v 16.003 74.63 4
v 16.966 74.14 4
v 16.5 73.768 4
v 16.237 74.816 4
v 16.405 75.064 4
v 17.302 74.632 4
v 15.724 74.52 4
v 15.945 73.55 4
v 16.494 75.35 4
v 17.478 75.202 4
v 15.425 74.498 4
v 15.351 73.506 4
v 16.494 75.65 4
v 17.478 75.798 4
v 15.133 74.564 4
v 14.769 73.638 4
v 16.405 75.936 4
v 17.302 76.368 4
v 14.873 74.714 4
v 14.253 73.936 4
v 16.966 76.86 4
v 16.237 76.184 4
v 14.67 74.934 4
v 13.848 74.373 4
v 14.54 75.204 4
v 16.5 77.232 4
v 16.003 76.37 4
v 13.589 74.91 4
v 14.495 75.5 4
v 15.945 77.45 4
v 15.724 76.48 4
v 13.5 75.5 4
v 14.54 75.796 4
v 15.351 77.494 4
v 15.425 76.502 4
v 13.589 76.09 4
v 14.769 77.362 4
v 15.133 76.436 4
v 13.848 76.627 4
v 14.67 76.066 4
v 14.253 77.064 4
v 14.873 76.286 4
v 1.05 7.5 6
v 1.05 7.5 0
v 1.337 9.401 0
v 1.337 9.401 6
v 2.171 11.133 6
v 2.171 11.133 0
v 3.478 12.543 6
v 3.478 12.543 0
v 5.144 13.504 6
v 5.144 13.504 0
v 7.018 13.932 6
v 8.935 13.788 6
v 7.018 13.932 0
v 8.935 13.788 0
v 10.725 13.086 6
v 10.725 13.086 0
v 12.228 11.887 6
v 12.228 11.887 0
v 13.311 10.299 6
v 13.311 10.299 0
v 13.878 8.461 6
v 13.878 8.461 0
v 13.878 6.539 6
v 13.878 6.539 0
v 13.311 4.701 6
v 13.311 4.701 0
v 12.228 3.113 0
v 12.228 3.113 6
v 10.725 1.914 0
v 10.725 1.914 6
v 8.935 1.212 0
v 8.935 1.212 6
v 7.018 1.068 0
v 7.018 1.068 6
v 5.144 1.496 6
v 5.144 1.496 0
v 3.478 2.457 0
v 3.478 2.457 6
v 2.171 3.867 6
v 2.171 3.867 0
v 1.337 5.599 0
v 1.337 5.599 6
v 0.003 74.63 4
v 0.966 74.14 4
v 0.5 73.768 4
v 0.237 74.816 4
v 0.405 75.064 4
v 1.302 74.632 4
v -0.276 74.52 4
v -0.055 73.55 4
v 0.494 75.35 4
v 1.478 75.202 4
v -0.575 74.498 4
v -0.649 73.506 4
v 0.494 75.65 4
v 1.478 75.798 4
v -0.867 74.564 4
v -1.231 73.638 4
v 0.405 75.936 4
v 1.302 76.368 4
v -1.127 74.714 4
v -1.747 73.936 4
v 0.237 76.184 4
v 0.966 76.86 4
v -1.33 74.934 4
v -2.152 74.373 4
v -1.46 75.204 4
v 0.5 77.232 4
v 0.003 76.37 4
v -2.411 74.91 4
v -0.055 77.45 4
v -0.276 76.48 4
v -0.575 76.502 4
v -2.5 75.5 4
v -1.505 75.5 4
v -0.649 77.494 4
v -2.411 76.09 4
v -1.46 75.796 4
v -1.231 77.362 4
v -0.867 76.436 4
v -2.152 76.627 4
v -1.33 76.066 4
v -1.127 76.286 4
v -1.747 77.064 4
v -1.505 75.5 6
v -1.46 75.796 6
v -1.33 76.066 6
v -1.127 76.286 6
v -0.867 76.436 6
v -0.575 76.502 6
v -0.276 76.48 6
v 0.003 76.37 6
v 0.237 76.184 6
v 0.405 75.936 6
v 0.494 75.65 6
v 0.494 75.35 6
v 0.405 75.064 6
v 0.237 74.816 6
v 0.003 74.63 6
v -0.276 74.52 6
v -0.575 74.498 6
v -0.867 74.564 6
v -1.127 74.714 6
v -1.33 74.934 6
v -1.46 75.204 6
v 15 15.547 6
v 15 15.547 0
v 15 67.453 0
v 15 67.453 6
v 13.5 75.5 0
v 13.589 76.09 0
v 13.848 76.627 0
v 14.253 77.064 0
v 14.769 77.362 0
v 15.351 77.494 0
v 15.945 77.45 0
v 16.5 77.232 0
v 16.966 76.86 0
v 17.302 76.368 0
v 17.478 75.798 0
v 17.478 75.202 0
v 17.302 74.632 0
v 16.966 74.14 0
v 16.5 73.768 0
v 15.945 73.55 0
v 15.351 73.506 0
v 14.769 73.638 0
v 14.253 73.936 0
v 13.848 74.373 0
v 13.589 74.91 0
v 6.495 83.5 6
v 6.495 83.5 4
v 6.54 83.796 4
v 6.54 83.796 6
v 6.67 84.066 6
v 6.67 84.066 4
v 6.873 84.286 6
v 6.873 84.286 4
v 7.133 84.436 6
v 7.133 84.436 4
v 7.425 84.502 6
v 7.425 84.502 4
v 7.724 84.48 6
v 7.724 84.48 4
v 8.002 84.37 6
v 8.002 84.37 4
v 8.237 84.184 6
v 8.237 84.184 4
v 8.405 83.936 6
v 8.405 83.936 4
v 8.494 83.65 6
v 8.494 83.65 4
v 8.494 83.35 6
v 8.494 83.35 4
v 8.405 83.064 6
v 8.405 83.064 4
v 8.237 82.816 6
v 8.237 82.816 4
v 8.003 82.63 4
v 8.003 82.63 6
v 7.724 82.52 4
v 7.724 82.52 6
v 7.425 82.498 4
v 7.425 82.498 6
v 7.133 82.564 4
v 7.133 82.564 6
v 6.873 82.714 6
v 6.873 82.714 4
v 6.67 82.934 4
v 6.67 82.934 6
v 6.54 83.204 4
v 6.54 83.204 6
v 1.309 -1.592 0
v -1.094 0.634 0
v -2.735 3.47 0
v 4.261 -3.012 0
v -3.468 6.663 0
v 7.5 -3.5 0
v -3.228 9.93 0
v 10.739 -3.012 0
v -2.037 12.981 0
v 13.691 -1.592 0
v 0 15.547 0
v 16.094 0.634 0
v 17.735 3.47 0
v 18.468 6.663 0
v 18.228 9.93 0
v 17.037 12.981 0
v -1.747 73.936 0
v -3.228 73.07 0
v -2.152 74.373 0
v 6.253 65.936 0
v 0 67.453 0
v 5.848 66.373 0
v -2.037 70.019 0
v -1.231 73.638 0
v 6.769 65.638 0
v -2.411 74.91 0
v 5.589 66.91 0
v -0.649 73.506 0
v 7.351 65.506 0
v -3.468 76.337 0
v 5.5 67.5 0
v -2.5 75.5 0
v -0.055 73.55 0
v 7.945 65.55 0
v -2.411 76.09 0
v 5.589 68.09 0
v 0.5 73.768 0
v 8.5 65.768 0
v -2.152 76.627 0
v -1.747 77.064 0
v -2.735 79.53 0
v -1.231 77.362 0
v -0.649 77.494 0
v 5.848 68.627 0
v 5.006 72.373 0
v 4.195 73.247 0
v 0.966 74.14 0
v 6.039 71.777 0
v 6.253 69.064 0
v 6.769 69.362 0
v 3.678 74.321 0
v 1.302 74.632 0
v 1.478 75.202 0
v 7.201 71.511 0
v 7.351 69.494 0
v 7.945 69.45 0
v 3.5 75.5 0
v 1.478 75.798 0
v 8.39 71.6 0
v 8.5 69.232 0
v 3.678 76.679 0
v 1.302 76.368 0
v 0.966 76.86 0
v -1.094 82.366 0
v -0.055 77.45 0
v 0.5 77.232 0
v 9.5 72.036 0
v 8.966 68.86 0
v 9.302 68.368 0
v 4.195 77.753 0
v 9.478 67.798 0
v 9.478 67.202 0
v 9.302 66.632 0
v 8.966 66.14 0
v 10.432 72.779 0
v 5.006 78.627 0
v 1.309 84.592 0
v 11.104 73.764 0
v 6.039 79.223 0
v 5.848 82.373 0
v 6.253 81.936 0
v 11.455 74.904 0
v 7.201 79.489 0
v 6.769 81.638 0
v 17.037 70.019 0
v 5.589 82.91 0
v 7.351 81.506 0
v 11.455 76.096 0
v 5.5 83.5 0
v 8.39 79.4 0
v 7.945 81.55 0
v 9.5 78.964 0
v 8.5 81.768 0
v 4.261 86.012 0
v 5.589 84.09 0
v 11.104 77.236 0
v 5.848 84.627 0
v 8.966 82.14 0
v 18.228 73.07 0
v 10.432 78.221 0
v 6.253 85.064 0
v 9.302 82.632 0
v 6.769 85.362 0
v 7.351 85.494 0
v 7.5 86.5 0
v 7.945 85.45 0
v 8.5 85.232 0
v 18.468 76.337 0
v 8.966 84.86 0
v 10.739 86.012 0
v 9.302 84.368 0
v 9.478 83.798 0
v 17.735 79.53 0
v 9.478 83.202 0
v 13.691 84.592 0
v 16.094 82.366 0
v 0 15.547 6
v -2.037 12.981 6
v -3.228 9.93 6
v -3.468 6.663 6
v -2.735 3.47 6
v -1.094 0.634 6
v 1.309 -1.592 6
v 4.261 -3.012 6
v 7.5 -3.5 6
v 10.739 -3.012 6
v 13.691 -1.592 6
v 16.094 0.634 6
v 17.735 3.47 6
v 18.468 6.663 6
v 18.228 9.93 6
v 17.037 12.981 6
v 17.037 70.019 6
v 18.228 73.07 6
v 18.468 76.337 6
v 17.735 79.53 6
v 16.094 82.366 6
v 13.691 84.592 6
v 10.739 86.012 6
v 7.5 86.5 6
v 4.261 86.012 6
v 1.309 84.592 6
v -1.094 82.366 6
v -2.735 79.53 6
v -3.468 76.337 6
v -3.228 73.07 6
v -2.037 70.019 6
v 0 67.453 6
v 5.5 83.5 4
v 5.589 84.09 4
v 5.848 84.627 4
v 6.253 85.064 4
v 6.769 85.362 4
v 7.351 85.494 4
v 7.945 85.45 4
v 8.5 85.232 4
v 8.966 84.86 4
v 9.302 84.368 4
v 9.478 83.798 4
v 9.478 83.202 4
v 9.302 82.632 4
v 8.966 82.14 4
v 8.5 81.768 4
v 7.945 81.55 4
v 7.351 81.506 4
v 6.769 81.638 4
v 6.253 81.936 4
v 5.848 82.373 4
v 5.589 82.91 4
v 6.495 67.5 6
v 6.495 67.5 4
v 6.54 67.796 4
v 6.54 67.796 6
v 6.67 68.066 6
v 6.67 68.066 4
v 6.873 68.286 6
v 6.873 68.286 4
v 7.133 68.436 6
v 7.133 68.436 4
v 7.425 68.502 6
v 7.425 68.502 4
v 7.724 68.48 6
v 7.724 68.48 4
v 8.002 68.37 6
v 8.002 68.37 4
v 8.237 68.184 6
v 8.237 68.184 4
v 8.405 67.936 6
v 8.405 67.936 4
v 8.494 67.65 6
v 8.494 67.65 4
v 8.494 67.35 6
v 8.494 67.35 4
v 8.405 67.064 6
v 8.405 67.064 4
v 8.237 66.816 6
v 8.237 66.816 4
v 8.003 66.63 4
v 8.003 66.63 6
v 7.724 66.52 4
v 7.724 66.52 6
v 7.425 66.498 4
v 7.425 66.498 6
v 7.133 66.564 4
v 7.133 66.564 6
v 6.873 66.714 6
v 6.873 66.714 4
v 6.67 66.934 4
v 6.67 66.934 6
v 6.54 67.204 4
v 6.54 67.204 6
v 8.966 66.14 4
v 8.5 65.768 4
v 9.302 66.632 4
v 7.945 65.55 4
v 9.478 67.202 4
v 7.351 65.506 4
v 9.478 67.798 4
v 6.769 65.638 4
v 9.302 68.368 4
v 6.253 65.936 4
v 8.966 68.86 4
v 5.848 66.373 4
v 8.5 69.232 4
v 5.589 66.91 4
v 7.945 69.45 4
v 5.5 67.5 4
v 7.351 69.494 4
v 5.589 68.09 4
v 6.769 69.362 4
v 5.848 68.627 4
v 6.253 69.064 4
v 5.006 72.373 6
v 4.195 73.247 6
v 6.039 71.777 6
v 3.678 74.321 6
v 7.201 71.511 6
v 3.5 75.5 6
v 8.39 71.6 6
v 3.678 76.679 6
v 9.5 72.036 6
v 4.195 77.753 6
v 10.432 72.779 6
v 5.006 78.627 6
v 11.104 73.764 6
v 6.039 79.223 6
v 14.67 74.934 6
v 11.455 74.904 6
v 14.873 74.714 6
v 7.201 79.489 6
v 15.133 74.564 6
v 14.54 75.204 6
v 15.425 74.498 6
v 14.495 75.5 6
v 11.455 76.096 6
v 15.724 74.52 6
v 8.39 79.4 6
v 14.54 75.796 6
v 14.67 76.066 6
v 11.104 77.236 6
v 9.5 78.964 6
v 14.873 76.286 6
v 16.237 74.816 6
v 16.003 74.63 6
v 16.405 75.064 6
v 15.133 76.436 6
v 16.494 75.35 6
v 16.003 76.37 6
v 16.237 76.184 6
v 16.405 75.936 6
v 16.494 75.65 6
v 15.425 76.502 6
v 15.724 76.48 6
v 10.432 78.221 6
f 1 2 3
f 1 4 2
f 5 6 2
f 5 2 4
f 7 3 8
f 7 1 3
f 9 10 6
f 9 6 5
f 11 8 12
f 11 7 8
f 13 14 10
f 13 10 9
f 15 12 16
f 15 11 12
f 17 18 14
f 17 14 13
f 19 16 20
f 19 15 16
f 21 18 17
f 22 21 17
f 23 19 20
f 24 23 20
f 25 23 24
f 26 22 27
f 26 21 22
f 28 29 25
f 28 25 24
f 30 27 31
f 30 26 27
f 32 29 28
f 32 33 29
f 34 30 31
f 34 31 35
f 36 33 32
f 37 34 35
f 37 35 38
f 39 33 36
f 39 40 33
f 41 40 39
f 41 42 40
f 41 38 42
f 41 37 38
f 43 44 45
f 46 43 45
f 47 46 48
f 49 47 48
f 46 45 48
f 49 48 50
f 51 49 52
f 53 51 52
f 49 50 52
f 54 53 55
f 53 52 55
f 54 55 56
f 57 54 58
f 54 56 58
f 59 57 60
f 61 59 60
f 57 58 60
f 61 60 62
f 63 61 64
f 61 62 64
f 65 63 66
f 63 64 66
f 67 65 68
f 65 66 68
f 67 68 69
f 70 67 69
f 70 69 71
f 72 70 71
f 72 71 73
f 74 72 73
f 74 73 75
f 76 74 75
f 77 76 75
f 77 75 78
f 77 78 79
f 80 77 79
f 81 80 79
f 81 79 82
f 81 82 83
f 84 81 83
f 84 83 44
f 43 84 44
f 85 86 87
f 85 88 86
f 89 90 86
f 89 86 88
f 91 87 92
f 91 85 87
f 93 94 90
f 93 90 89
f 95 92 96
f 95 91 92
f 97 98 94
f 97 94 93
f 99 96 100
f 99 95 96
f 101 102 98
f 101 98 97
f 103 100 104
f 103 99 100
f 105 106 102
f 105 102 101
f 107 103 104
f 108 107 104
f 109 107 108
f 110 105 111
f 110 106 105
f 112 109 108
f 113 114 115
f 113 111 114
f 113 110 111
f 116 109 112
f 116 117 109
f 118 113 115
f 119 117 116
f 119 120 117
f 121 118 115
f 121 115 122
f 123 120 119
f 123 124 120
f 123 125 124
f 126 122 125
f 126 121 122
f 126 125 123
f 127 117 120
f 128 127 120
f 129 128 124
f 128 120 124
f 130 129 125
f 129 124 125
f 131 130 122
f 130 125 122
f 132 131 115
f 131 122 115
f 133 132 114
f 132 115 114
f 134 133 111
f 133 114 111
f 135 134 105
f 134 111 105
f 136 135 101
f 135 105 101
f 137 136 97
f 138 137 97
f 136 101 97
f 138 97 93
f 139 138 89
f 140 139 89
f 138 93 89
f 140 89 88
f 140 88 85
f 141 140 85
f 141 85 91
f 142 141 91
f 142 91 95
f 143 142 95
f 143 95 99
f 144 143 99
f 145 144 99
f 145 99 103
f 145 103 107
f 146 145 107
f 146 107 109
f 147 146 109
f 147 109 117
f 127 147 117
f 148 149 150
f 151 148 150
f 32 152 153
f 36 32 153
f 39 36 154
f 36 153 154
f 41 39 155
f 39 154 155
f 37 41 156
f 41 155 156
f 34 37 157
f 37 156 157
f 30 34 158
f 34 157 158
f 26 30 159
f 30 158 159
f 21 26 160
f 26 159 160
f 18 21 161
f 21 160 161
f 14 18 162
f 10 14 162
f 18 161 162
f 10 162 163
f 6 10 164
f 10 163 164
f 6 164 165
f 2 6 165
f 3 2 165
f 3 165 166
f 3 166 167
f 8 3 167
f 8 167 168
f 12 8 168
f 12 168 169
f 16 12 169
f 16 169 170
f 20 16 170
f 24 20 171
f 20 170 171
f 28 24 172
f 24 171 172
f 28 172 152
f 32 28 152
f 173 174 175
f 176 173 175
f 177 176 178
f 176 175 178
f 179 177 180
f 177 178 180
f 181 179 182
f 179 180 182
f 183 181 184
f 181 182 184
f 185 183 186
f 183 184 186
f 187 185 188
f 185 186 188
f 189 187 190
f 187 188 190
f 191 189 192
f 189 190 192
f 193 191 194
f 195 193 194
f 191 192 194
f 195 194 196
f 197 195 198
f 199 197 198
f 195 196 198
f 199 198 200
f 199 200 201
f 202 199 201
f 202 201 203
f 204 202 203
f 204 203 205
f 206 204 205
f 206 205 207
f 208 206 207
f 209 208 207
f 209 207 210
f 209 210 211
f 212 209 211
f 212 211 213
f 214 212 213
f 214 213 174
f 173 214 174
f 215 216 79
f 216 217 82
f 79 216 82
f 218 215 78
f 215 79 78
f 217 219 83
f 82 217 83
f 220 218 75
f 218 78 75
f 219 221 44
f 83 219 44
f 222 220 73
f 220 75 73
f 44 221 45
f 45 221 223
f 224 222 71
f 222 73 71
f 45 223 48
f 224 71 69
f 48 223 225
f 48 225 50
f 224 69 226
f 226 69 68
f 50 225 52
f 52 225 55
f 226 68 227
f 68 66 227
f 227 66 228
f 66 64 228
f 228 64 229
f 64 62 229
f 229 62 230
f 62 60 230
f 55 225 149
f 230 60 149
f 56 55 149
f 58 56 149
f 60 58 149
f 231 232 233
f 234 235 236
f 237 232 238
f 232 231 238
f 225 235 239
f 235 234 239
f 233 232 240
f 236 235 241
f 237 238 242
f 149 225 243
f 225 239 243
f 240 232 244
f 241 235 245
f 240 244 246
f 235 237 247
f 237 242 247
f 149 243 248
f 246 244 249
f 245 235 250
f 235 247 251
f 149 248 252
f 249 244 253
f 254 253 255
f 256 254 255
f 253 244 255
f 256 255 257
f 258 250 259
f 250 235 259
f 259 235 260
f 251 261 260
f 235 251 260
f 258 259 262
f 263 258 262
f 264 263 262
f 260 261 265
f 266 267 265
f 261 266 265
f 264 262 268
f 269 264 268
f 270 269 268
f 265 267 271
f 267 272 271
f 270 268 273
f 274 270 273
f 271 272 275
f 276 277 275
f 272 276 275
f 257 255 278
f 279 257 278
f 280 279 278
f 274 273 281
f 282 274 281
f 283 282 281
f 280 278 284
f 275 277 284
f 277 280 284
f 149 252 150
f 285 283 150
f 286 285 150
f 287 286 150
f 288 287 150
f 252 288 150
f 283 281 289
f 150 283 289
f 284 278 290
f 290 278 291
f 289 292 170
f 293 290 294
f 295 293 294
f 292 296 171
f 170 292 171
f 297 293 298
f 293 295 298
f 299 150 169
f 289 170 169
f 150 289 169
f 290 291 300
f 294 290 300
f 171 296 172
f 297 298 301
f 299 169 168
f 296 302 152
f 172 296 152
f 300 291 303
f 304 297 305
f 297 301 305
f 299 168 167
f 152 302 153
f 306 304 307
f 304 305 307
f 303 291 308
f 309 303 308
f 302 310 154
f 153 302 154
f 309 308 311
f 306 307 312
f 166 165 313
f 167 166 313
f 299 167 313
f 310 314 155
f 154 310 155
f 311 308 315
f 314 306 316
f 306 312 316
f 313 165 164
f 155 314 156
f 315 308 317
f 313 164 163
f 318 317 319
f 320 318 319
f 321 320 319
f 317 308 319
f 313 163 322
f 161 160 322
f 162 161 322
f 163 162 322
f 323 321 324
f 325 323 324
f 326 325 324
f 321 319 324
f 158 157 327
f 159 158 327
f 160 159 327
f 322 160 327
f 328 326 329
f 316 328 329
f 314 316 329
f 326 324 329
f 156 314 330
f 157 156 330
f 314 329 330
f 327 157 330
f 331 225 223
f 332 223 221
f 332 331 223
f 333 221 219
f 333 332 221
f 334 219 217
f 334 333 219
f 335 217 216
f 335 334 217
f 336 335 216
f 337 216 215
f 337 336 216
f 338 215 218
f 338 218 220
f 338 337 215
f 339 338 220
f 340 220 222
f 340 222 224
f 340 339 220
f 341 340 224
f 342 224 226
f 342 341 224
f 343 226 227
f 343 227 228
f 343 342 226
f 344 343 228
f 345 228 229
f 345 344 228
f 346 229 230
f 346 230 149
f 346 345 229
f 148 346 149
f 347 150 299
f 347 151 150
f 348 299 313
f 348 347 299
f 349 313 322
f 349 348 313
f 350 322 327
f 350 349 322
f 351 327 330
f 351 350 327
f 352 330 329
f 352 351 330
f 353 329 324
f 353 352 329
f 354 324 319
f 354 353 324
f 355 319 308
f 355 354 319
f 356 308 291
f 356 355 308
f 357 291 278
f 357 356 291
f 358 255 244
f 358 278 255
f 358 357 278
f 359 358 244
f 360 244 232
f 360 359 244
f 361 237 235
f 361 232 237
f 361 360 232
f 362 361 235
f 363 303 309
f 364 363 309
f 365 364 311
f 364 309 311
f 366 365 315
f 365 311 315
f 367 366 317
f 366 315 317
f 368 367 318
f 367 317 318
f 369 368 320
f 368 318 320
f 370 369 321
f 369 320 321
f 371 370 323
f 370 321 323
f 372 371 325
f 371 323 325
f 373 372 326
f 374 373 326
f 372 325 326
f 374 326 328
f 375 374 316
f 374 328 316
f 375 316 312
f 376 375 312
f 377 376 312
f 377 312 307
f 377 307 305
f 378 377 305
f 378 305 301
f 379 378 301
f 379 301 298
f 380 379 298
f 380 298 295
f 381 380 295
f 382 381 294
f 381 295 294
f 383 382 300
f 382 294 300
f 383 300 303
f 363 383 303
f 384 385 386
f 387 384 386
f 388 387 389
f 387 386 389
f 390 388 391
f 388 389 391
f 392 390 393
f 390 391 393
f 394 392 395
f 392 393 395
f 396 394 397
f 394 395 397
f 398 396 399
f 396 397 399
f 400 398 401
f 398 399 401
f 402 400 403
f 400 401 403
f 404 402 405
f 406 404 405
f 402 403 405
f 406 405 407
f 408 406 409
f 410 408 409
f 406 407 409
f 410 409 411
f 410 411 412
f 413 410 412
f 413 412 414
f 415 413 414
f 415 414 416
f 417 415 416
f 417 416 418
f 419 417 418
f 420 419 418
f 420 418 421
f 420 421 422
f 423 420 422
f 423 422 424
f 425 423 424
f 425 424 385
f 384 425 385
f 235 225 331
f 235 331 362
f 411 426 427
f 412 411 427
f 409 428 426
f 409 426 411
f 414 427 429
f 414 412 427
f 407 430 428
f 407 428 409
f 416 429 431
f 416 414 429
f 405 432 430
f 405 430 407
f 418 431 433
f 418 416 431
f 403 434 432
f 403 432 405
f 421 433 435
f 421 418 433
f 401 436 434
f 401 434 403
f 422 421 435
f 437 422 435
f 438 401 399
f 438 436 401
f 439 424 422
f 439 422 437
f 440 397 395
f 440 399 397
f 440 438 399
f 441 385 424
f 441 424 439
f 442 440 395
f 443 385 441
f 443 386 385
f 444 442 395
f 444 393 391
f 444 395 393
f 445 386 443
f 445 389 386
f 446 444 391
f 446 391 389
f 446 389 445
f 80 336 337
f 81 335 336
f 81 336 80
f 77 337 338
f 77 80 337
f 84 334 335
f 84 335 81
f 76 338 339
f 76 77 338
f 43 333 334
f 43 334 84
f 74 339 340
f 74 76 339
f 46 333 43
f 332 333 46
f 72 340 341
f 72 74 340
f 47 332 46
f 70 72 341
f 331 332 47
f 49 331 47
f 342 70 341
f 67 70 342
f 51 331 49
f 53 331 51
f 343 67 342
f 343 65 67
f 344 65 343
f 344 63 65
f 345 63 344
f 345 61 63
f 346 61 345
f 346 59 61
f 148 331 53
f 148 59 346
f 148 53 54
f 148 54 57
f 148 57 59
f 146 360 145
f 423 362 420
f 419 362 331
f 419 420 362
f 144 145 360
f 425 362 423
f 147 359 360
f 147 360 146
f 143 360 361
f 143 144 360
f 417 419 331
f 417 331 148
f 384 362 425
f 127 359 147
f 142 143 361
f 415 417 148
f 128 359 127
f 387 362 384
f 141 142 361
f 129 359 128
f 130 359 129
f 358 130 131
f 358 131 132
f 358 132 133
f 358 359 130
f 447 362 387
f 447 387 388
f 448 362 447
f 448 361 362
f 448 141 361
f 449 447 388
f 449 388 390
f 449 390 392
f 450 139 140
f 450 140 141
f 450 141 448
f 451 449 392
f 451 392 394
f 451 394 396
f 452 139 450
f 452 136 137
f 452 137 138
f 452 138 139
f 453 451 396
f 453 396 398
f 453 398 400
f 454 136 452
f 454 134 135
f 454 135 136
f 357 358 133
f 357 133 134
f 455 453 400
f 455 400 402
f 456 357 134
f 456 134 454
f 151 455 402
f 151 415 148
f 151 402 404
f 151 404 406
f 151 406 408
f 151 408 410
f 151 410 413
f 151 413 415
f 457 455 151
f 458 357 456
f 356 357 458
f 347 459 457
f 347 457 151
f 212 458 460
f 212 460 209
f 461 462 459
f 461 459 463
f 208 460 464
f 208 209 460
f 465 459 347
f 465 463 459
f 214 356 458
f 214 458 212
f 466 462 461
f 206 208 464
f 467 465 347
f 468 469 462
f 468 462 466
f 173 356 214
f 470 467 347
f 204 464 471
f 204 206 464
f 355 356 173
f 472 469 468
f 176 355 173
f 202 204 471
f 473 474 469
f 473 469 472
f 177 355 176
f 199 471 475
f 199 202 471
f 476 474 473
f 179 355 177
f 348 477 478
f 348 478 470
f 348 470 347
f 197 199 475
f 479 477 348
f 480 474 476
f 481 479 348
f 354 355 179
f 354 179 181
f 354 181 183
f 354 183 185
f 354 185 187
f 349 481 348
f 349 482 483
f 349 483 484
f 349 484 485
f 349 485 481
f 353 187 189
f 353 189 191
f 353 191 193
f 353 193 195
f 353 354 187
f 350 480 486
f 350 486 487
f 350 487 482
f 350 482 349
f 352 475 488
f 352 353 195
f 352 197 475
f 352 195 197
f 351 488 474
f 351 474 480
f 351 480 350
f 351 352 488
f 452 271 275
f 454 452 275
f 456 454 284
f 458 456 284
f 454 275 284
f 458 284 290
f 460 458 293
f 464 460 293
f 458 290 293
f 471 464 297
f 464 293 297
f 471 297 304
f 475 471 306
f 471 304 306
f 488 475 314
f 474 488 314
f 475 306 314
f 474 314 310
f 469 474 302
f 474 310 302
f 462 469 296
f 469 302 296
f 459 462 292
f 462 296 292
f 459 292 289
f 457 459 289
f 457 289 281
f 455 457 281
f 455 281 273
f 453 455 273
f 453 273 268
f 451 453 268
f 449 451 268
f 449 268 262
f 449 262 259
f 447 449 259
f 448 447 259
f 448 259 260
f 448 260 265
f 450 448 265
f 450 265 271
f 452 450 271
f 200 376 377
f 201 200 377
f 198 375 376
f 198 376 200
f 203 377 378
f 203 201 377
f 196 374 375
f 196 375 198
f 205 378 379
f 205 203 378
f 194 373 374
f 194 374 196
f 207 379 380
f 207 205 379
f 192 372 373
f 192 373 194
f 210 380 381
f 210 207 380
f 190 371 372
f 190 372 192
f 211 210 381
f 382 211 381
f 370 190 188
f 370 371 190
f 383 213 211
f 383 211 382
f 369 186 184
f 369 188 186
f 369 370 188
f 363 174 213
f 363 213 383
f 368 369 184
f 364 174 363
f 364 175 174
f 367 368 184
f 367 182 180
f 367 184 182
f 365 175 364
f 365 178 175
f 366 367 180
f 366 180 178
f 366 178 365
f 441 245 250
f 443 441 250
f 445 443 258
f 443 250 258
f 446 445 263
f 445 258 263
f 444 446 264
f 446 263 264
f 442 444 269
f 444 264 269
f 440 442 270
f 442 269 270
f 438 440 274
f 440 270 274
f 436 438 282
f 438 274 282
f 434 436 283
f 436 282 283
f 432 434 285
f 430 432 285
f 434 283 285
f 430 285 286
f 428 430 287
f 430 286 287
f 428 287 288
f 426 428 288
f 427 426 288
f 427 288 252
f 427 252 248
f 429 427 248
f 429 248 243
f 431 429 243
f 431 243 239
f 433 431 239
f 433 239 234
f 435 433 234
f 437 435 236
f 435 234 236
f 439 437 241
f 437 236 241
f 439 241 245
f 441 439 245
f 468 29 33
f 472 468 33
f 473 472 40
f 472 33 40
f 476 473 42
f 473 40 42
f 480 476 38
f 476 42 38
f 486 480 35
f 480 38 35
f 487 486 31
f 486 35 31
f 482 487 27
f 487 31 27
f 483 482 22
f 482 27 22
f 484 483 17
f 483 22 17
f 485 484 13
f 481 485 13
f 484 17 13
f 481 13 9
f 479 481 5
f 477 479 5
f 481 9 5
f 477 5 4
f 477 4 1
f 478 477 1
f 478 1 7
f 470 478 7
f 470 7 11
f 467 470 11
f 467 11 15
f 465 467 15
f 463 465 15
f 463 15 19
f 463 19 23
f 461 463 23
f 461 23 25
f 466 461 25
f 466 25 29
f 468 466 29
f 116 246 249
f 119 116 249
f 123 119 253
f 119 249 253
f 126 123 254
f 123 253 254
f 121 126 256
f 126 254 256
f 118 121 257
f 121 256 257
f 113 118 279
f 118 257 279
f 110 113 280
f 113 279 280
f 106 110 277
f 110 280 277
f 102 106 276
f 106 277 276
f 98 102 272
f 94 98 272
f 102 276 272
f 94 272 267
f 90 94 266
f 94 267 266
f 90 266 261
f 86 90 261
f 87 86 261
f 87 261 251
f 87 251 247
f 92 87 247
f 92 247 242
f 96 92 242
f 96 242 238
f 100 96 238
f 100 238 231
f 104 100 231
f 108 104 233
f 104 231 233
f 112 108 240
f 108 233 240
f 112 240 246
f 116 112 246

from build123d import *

# Parameters (mm, degrees)
ESQUISSE1_W             = 15
ESQUISSE1_H             = 83
BOSS_EXTRU_1_DEPTH      = 6
ESQUISSE2_R             = 11
BOSS_EXTRU_2_DEPTH      = 6
ESQUISSE4_R             = 4
ESQUISSE4_R_2           = 1.005
ESQUISSE4_R_3           = 6.45
ENL_V_MAT_EXTRU_2_DEPTH = 10
ESQUISSE5_R             = 2
ENL_V_MAT_EXTRU_3_DEPTH = 4


with BuildPart() as part:
    # Esquisse1 → Boss.-Extru.1 (new body)
    with BuildSketch(Plane.XY):
        with Locations((7.5, 41.5)):
            Rectangle(ESQUISSE1_W, ESQUISSE1_H)
    extrude(amount=BOSS_EXTRU_1_DEPTH)

    # Esquisse2 → Boss.-Extru.2 (add)
    with BuildSketch(Plane.XY.offset(6)):
        with Locations((7.5, 7.5)):
            Circle(ESQUISSE2_R)
        with Locations((7.5, 75.5)):
            Circle(ESQUISSE2_R)
    extrude(amount=-BOSS_EXTRU_2_DEPTH)

    # Esquisse4 → Enlèv. mat.-Extru.2 (cut)
    with BuildSketch(Plane(origin=(0, 0, 0), x_dir=(-1, 0, 0), z_dir=(0, 0, -1))):
        with Locations((-7.5, 75.5)):
            Circle(ESQUISSE4_R)
        with Locations((-7.5, 67.5)):
            Circle(ESQUISSE4_R_2)
        with Locations((-15.5, 75.5)):
            Circle(ESQUISSE4_R_2)
        with Locations((-7.5, 83.5)):
            Circle(ESQUISSE4_R_2)
        with Locations((0.5, 75.5)):
            Circle(ESQUISSE4_R_2)
        with Locations((-7.5, 7.5)):
            Circle(ESQUISSE4_R_3)
    extrude(amount=-ENL_V_MAT_EXTRU_2_DEPTH, mode=Mode.SUBTRACT)

    # Esquisse5 → Enlèv. mat.-Extru.3 (cut)
    with BuildSketch(Plane(origin=(0, 0, 0), x_dir=(-1, 0, 0), z_dir=(0, 0, -1))):
        with Locations((-15.5, 75.5)):
            Circle(ESQUISSE5_R)
        with Locations((-7.5, 83.5)):
            Circle(ESQUISSE5_R)
        with Locations((0.5, 75.5)):
            Circle(ESQUISSE5_R)
        with Locations((-7.5, 67.5)):
            Circle(ESQUISSE5_R)
    extrude(amount=-ENL_V_MAT_EXTRU_3_DEPTH, mode=Mode.SUBTRACT)


solid = part.part
